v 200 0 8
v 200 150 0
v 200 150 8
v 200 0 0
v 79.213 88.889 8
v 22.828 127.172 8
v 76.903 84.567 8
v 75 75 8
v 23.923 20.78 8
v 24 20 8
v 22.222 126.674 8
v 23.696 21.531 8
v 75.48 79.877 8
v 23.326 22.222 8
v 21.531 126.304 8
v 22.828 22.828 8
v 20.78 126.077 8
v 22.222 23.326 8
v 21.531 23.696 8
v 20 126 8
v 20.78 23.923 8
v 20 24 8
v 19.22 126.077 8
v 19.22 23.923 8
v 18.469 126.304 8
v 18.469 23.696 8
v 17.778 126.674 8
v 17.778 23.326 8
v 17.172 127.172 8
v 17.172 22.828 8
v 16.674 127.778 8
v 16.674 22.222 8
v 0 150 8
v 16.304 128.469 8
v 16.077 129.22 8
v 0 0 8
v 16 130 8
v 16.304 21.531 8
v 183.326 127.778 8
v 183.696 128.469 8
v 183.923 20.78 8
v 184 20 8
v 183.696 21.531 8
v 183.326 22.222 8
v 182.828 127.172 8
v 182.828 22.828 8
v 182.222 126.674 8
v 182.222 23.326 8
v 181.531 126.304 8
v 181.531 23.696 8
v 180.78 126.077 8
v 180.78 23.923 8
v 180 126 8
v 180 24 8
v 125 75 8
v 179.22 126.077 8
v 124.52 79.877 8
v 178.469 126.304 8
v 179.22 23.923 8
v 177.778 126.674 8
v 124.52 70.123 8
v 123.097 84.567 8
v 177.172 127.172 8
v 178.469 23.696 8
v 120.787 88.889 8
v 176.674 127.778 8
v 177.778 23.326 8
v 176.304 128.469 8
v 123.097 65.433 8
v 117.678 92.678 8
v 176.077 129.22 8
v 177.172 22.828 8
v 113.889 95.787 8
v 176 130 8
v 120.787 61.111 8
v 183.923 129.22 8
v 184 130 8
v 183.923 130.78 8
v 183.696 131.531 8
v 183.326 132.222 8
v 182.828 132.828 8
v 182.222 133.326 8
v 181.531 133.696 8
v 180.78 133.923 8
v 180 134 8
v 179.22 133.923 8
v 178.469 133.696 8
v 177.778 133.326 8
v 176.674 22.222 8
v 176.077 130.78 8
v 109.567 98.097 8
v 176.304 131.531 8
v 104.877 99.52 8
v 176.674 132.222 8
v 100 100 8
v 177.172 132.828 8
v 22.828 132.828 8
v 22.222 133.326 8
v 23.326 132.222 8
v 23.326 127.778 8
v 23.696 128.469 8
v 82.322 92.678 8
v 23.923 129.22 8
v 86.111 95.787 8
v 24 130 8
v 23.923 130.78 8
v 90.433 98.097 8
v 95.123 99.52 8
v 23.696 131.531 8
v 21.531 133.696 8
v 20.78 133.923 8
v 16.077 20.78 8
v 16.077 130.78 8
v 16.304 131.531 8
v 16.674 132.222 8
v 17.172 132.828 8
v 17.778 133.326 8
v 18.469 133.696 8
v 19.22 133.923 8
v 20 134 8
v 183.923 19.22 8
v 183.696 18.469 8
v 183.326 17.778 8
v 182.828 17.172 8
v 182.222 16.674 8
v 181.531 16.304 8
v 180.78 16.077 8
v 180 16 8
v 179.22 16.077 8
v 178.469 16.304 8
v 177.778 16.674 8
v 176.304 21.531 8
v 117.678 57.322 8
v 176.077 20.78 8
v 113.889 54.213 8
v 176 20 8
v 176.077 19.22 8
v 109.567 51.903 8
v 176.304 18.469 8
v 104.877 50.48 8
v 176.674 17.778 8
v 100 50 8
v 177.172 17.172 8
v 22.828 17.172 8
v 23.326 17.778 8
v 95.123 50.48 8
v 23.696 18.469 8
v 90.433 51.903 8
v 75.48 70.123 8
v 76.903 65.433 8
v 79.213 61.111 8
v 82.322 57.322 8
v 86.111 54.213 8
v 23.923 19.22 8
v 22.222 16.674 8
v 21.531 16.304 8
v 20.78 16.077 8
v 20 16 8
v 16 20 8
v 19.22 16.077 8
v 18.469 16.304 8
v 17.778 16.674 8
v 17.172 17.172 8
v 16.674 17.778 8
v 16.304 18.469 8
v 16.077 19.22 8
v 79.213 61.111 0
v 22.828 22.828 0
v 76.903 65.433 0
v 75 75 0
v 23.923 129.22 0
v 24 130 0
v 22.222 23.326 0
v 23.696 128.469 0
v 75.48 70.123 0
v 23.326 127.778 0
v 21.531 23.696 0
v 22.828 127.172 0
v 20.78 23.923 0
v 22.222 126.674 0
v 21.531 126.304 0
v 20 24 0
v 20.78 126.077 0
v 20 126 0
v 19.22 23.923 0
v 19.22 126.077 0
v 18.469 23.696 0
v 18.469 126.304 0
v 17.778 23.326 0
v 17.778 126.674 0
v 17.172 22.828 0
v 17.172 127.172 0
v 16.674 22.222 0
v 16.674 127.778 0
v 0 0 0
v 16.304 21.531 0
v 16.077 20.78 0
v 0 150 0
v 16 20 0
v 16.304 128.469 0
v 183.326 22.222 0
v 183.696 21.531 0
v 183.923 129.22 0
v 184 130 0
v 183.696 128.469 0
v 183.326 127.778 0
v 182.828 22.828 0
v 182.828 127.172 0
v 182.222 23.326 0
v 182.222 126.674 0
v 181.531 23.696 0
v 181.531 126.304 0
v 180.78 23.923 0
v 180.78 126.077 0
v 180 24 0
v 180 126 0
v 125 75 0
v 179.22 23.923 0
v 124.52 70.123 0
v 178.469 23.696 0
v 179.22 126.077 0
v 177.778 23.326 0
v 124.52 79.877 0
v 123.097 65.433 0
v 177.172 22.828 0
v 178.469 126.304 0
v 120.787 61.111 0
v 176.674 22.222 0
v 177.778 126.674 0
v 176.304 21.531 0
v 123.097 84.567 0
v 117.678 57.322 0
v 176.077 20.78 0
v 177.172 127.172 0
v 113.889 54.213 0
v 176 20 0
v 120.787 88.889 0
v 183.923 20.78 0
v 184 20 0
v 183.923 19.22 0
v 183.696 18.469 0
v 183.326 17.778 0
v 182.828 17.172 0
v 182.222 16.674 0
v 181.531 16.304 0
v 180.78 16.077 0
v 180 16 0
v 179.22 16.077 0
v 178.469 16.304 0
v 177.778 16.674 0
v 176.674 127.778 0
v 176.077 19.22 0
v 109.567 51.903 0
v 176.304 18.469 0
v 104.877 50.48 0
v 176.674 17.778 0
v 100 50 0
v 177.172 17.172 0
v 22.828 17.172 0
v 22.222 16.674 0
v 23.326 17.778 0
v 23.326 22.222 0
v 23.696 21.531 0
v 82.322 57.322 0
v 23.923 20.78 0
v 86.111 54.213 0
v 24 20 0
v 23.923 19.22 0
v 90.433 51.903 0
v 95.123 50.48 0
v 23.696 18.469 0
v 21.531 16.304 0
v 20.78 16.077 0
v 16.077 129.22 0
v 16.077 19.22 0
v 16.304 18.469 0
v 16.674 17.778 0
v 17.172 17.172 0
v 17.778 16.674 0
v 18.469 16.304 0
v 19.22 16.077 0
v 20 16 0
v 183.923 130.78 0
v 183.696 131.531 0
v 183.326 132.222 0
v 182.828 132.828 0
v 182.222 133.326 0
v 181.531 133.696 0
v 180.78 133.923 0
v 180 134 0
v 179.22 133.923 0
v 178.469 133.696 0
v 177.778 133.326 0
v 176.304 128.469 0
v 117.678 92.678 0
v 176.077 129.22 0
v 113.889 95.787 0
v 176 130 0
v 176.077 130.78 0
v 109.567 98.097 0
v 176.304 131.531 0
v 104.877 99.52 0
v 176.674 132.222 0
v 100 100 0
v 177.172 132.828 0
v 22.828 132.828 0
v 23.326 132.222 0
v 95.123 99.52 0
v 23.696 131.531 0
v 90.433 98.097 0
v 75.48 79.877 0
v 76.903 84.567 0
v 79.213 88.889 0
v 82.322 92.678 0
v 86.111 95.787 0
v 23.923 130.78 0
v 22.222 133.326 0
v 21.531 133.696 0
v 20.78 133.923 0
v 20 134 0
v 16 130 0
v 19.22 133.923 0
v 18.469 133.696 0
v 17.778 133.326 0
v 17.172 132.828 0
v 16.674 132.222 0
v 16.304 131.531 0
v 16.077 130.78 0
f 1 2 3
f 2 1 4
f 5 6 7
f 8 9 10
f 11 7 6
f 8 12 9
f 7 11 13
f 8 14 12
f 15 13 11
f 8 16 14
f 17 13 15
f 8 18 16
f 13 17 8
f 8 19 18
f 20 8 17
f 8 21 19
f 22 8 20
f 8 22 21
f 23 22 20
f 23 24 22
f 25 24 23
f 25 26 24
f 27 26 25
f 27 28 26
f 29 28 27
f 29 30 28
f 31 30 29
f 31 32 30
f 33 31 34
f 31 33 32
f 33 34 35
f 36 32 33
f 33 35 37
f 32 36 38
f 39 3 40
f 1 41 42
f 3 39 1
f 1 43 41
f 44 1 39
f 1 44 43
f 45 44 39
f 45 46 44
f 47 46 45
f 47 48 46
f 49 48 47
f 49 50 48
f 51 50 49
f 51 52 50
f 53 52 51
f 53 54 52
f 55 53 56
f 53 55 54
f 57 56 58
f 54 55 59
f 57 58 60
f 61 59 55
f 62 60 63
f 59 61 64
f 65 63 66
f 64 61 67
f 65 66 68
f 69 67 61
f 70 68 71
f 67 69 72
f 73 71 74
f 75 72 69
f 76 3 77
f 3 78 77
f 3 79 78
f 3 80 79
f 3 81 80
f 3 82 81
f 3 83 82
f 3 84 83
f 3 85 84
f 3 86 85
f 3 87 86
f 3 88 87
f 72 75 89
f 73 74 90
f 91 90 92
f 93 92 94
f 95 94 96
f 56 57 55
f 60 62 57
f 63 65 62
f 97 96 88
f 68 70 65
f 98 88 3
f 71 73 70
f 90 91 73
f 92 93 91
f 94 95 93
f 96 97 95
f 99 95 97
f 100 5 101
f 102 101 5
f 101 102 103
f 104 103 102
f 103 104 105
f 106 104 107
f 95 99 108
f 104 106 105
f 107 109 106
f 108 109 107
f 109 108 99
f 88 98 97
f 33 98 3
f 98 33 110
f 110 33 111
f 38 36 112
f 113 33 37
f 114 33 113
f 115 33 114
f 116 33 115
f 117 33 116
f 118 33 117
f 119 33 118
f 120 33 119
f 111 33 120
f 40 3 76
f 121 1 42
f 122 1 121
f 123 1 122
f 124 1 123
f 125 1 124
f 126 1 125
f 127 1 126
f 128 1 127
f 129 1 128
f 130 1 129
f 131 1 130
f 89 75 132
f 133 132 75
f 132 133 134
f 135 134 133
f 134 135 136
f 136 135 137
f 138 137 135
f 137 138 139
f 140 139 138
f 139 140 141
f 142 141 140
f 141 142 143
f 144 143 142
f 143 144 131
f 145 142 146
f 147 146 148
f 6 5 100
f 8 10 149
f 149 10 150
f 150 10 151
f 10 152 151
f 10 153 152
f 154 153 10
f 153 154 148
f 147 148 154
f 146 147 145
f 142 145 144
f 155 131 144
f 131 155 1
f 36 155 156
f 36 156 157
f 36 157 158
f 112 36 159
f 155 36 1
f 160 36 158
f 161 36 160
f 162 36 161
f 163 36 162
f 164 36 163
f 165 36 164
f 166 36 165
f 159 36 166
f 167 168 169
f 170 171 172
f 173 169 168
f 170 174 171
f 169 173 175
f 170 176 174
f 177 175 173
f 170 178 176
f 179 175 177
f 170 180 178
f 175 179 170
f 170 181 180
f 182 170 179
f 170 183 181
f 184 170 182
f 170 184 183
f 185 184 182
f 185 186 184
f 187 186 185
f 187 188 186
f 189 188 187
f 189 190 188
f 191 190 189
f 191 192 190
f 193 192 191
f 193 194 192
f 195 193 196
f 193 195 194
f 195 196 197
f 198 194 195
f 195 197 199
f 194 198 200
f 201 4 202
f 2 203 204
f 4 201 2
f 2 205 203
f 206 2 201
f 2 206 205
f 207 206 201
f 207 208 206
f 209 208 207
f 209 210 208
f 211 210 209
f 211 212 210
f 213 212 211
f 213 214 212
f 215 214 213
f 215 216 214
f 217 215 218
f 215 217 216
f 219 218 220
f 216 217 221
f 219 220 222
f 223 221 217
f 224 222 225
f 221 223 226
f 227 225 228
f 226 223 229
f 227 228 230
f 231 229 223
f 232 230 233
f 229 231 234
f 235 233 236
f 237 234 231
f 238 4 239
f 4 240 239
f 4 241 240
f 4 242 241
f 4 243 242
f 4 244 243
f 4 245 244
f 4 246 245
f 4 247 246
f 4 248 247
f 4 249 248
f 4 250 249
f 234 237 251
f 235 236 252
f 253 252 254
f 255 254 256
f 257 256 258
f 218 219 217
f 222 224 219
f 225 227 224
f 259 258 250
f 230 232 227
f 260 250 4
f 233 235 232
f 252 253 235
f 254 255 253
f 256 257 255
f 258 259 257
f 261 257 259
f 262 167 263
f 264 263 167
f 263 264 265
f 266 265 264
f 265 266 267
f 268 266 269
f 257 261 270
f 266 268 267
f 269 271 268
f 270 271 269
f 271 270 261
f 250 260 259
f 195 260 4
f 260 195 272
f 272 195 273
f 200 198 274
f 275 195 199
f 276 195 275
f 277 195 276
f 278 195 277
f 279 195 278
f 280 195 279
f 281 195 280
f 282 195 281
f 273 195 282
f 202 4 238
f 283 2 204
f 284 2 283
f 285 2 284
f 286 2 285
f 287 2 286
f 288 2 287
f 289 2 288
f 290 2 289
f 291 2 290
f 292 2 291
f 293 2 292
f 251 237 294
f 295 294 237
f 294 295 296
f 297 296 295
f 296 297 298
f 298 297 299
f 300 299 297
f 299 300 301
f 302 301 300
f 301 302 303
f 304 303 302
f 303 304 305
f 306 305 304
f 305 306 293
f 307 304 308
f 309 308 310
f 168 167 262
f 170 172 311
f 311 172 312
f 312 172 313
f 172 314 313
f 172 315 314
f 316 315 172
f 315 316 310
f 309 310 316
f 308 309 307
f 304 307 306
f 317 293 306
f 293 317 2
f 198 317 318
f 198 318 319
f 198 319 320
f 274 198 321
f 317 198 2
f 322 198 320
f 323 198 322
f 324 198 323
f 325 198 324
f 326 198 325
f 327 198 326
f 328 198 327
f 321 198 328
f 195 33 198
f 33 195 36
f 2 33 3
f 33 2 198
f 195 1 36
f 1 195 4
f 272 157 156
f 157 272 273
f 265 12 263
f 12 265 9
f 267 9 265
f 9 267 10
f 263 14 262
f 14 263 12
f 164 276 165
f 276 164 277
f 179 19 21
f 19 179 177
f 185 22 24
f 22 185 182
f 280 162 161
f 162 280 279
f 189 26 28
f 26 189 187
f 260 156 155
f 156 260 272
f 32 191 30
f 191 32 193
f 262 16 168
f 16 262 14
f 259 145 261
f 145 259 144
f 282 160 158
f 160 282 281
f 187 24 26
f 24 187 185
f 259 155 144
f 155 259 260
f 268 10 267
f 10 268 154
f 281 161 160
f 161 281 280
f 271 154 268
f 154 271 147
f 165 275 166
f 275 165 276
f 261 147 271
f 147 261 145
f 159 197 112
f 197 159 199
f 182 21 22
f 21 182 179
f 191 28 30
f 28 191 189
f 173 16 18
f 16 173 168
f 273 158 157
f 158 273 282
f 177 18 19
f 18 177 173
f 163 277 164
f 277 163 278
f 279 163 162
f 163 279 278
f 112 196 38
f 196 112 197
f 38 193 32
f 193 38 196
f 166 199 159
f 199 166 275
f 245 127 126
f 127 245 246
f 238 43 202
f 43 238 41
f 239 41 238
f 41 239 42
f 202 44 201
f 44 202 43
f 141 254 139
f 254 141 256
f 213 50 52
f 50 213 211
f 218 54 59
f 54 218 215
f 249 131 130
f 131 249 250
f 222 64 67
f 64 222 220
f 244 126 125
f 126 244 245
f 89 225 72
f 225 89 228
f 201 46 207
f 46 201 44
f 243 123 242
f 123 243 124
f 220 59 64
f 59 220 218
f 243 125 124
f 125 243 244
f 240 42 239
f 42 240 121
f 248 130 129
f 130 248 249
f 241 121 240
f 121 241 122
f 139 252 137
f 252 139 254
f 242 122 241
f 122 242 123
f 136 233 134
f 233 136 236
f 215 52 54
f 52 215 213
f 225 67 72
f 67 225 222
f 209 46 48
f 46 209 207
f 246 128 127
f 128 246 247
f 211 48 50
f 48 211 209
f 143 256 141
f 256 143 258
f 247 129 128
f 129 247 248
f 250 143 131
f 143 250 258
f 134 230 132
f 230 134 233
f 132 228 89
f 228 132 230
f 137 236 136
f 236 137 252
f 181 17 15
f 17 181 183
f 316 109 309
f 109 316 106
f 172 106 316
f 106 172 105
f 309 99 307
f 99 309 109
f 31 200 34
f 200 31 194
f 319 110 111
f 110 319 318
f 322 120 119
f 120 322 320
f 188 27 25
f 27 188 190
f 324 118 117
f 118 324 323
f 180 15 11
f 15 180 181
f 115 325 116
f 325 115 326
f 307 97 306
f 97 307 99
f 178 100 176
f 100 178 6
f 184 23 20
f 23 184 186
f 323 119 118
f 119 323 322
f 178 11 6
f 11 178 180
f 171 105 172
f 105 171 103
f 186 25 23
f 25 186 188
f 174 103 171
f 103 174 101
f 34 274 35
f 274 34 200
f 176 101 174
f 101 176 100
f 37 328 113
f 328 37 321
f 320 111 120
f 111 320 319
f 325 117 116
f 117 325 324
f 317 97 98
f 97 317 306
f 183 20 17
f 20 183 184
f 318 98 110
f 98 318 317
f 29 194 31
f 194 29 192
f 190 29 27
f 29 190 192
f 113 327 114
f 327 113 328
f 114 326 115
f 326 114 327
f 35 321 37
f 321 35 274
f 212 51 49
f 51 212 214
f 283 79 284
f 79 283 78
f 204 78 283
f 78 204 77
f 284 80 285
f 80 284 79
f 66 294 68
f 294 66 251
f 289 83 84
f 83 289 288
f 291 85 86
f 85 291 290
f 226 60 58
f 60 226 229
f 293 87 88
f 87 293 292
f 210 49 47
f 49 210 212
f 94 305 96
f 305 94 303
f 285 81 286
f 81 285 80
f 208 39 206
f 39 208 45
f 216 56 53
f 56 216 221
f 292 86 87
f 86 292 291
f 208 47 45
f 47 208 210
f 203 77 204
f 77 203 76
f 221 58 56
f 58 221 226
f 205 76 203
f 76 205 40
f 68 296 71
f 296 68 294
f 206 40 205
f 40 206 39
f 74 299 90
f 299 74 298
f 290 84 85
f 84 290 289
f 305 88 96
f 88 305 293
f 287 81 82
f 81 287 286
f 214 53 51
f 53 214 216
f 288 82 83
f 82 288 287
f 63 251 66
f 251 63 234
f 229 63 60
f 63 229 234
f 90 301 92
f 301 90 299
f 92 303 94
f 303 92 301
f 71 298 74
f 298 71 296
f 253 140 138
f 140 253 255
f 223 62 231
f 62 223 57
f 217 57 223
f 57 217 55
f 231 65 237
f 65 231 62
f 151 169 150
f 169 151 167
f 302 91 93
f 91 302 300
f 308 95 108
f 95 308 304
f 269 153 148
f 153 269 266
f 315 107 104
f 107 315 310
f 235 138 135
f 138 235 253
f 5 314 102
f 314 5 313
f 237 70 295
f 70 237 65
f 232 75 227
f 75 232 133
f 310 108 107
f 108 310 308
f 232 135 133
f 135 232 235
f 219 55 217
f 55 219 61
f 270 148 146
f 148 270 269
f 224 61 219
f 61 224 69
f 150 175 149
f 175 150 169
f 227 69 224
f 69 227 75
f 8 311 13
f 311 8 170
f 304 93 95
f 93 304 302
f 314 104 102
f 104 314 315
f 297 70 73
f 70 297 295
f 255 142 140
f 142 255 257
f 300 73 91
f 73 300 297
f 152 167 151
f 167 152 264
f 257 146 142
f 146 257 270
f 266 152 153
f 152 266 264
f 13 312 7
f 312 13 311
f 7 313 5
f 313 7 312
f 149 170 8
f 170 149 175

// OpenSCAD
$fn = 32;

// ----------------------------------------------------------------------
// Big plate: 200-250 mm adapter plate
// ----------------------------------------------------------------------

// --- parameters (mm) ---
plate_l = 200;            // plate length, X
plate_w = 150;            // plate width, Y
plate_t = 8;              // plate thickness, Z
corner_d = 8;             // corner hole diameter
corner_in = 20;           // corner hole inset from the edges
bore_d = 50;              // central bore

difference() {
  cube([plate_l, plate_w, plate_t]);
  translate([corner_in, corner_in, -1]) cylinder(h = plate_t + 2, d = corner_d);
  translate([plate_l - corner_in, corner_in, -1]) cylinder(h = plate_t + 2, d = corner_d);
  translate([corner_in, plate_w - corner_in, -1]) cylinder(h = plate_t + 2, d = corner_d);
  translate([plate_l - corner_in, plate_w - corner_in, -1]) cylinder(h = plate_t + 2, d = corner_d);
  translate([plate_l / 2, plate_w / 2, -1]) cylinder(h = plate_t + 2, d = bore_d);
}
